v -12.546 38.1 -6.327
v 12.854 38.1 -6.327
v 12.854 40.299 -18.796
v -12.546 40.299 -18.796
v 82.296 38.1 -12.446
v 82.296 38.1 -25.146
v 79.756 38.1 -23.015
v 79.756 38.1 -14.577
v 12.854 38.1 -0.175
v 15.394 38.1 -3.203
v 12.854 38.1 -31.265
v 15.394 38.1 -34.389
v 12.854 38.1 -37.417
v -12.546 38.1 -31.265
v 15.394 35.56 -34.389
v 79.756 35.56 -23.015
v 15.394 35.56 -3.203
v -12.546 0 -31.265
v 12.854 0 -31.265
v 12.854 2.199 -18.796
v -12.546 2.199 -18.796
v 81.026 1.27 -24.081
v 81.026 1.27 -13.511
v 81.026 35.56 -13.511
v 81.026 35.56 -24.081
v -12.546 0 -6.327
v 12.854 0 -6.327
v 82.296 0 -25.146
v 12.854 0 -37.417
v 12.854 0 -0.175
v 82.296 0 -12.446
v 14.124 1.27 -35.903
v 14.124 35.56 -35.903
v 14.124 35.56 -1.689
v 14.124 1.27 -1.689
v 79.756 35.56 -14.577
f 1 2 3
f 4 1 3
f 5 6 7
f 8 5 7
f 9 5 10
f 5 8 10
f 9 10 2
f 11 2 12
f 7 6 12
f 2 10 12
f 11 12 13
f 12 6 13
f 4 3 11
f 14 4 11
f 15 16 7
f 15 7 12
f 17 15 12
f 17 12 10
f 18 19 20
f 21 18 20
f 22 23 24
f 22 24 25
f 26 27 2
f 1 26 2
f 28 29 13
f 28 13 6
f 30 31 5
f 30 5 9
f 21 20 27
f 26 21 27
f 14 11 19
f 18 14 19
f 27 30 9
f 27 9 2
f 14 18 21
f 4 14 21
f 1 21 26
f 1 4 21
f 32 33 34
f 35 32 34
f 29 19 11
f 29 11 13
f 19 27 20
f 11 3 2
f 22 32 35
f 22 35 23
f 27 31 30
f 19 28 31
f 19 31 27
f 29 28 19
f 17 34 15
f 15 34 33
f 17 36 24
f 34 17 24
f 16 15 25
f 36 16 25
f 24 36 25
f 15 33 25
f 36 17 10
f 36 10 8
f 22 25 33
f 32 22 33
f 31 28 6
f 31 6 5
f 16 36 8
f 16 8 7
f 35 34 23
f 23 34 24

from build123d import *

# Parameters (mm, degrees)
BOSS_EXTRUDE1_DEPTH = 38.1
CUT_EXTRUDE1_DEPTH  = 2.54
CUT_EXTRUDE2_DEPTH  = 34.29
BOSS_EXTRUDE2_DEPTH = 25.4


with BuildPart() as part:
    # Sketch1 → Boss-Extrude1 (new body)
    with BuildSketch(Plane(origin=(0, 0, 0), x_dir=(1, 0, 0), z_dir=(0, 1, 0))):
        Polygon((12.853808955, 0.174987325), (12.853808955, 37.417012675), (82.296, 25.146), (82.296, 12.446), align=None)
    extrude(amount=BOSS_EXTRUDE1_DEPTH)

    # Sketch3 → Cut-Extrude1 (cut)
    with BuildSketch(Plane(origin=(0, 35.56, 0), x_dir=(1, 0, 0), z_dir=(0, 1, 0))):
        Polygon((79.756, 14.576512841), (79.756, 23.015487159), (15.393808955, 34.388821586), (15.393808955, 3.203178414), align=None)
    extrude(amount=CUT_EXTRUDE1_DEPTH, mode=Mode.SUBTRACT)

    # Sketch6 → Cut-Extrude2 (cut)
    with BuildSketch(Plane(origin=(0, 35.56, 0), x_dir=(1, 0, 0), z_dir=(0, 1, 0))):
        Polygon((81.026, 13.511256421), (81.026, 24.080743579), (14.123808955, 35.90291713), (14.123808955, 1.68908287), align=None)
    extrude(amount=-CUT_EXTRUDE2_DEPTH, mode=Mode.SUBTRACT)

    # Sketch8 → Boss-Extrude2 (add)
    with BuildSketch(Plane.ZY.offset(-12.853808955)):
        Polygon((-31.26502256, 38.1), (-31.26502256, 0), (-18.796, 2.1986251), (-6.32697744, 0), (-6.32697744, 38.1), (-18.796, 40.2986251), align=None)
    extrude(amount=BOSS_EXTRUDE2_DEPTH)


solid = part.part
